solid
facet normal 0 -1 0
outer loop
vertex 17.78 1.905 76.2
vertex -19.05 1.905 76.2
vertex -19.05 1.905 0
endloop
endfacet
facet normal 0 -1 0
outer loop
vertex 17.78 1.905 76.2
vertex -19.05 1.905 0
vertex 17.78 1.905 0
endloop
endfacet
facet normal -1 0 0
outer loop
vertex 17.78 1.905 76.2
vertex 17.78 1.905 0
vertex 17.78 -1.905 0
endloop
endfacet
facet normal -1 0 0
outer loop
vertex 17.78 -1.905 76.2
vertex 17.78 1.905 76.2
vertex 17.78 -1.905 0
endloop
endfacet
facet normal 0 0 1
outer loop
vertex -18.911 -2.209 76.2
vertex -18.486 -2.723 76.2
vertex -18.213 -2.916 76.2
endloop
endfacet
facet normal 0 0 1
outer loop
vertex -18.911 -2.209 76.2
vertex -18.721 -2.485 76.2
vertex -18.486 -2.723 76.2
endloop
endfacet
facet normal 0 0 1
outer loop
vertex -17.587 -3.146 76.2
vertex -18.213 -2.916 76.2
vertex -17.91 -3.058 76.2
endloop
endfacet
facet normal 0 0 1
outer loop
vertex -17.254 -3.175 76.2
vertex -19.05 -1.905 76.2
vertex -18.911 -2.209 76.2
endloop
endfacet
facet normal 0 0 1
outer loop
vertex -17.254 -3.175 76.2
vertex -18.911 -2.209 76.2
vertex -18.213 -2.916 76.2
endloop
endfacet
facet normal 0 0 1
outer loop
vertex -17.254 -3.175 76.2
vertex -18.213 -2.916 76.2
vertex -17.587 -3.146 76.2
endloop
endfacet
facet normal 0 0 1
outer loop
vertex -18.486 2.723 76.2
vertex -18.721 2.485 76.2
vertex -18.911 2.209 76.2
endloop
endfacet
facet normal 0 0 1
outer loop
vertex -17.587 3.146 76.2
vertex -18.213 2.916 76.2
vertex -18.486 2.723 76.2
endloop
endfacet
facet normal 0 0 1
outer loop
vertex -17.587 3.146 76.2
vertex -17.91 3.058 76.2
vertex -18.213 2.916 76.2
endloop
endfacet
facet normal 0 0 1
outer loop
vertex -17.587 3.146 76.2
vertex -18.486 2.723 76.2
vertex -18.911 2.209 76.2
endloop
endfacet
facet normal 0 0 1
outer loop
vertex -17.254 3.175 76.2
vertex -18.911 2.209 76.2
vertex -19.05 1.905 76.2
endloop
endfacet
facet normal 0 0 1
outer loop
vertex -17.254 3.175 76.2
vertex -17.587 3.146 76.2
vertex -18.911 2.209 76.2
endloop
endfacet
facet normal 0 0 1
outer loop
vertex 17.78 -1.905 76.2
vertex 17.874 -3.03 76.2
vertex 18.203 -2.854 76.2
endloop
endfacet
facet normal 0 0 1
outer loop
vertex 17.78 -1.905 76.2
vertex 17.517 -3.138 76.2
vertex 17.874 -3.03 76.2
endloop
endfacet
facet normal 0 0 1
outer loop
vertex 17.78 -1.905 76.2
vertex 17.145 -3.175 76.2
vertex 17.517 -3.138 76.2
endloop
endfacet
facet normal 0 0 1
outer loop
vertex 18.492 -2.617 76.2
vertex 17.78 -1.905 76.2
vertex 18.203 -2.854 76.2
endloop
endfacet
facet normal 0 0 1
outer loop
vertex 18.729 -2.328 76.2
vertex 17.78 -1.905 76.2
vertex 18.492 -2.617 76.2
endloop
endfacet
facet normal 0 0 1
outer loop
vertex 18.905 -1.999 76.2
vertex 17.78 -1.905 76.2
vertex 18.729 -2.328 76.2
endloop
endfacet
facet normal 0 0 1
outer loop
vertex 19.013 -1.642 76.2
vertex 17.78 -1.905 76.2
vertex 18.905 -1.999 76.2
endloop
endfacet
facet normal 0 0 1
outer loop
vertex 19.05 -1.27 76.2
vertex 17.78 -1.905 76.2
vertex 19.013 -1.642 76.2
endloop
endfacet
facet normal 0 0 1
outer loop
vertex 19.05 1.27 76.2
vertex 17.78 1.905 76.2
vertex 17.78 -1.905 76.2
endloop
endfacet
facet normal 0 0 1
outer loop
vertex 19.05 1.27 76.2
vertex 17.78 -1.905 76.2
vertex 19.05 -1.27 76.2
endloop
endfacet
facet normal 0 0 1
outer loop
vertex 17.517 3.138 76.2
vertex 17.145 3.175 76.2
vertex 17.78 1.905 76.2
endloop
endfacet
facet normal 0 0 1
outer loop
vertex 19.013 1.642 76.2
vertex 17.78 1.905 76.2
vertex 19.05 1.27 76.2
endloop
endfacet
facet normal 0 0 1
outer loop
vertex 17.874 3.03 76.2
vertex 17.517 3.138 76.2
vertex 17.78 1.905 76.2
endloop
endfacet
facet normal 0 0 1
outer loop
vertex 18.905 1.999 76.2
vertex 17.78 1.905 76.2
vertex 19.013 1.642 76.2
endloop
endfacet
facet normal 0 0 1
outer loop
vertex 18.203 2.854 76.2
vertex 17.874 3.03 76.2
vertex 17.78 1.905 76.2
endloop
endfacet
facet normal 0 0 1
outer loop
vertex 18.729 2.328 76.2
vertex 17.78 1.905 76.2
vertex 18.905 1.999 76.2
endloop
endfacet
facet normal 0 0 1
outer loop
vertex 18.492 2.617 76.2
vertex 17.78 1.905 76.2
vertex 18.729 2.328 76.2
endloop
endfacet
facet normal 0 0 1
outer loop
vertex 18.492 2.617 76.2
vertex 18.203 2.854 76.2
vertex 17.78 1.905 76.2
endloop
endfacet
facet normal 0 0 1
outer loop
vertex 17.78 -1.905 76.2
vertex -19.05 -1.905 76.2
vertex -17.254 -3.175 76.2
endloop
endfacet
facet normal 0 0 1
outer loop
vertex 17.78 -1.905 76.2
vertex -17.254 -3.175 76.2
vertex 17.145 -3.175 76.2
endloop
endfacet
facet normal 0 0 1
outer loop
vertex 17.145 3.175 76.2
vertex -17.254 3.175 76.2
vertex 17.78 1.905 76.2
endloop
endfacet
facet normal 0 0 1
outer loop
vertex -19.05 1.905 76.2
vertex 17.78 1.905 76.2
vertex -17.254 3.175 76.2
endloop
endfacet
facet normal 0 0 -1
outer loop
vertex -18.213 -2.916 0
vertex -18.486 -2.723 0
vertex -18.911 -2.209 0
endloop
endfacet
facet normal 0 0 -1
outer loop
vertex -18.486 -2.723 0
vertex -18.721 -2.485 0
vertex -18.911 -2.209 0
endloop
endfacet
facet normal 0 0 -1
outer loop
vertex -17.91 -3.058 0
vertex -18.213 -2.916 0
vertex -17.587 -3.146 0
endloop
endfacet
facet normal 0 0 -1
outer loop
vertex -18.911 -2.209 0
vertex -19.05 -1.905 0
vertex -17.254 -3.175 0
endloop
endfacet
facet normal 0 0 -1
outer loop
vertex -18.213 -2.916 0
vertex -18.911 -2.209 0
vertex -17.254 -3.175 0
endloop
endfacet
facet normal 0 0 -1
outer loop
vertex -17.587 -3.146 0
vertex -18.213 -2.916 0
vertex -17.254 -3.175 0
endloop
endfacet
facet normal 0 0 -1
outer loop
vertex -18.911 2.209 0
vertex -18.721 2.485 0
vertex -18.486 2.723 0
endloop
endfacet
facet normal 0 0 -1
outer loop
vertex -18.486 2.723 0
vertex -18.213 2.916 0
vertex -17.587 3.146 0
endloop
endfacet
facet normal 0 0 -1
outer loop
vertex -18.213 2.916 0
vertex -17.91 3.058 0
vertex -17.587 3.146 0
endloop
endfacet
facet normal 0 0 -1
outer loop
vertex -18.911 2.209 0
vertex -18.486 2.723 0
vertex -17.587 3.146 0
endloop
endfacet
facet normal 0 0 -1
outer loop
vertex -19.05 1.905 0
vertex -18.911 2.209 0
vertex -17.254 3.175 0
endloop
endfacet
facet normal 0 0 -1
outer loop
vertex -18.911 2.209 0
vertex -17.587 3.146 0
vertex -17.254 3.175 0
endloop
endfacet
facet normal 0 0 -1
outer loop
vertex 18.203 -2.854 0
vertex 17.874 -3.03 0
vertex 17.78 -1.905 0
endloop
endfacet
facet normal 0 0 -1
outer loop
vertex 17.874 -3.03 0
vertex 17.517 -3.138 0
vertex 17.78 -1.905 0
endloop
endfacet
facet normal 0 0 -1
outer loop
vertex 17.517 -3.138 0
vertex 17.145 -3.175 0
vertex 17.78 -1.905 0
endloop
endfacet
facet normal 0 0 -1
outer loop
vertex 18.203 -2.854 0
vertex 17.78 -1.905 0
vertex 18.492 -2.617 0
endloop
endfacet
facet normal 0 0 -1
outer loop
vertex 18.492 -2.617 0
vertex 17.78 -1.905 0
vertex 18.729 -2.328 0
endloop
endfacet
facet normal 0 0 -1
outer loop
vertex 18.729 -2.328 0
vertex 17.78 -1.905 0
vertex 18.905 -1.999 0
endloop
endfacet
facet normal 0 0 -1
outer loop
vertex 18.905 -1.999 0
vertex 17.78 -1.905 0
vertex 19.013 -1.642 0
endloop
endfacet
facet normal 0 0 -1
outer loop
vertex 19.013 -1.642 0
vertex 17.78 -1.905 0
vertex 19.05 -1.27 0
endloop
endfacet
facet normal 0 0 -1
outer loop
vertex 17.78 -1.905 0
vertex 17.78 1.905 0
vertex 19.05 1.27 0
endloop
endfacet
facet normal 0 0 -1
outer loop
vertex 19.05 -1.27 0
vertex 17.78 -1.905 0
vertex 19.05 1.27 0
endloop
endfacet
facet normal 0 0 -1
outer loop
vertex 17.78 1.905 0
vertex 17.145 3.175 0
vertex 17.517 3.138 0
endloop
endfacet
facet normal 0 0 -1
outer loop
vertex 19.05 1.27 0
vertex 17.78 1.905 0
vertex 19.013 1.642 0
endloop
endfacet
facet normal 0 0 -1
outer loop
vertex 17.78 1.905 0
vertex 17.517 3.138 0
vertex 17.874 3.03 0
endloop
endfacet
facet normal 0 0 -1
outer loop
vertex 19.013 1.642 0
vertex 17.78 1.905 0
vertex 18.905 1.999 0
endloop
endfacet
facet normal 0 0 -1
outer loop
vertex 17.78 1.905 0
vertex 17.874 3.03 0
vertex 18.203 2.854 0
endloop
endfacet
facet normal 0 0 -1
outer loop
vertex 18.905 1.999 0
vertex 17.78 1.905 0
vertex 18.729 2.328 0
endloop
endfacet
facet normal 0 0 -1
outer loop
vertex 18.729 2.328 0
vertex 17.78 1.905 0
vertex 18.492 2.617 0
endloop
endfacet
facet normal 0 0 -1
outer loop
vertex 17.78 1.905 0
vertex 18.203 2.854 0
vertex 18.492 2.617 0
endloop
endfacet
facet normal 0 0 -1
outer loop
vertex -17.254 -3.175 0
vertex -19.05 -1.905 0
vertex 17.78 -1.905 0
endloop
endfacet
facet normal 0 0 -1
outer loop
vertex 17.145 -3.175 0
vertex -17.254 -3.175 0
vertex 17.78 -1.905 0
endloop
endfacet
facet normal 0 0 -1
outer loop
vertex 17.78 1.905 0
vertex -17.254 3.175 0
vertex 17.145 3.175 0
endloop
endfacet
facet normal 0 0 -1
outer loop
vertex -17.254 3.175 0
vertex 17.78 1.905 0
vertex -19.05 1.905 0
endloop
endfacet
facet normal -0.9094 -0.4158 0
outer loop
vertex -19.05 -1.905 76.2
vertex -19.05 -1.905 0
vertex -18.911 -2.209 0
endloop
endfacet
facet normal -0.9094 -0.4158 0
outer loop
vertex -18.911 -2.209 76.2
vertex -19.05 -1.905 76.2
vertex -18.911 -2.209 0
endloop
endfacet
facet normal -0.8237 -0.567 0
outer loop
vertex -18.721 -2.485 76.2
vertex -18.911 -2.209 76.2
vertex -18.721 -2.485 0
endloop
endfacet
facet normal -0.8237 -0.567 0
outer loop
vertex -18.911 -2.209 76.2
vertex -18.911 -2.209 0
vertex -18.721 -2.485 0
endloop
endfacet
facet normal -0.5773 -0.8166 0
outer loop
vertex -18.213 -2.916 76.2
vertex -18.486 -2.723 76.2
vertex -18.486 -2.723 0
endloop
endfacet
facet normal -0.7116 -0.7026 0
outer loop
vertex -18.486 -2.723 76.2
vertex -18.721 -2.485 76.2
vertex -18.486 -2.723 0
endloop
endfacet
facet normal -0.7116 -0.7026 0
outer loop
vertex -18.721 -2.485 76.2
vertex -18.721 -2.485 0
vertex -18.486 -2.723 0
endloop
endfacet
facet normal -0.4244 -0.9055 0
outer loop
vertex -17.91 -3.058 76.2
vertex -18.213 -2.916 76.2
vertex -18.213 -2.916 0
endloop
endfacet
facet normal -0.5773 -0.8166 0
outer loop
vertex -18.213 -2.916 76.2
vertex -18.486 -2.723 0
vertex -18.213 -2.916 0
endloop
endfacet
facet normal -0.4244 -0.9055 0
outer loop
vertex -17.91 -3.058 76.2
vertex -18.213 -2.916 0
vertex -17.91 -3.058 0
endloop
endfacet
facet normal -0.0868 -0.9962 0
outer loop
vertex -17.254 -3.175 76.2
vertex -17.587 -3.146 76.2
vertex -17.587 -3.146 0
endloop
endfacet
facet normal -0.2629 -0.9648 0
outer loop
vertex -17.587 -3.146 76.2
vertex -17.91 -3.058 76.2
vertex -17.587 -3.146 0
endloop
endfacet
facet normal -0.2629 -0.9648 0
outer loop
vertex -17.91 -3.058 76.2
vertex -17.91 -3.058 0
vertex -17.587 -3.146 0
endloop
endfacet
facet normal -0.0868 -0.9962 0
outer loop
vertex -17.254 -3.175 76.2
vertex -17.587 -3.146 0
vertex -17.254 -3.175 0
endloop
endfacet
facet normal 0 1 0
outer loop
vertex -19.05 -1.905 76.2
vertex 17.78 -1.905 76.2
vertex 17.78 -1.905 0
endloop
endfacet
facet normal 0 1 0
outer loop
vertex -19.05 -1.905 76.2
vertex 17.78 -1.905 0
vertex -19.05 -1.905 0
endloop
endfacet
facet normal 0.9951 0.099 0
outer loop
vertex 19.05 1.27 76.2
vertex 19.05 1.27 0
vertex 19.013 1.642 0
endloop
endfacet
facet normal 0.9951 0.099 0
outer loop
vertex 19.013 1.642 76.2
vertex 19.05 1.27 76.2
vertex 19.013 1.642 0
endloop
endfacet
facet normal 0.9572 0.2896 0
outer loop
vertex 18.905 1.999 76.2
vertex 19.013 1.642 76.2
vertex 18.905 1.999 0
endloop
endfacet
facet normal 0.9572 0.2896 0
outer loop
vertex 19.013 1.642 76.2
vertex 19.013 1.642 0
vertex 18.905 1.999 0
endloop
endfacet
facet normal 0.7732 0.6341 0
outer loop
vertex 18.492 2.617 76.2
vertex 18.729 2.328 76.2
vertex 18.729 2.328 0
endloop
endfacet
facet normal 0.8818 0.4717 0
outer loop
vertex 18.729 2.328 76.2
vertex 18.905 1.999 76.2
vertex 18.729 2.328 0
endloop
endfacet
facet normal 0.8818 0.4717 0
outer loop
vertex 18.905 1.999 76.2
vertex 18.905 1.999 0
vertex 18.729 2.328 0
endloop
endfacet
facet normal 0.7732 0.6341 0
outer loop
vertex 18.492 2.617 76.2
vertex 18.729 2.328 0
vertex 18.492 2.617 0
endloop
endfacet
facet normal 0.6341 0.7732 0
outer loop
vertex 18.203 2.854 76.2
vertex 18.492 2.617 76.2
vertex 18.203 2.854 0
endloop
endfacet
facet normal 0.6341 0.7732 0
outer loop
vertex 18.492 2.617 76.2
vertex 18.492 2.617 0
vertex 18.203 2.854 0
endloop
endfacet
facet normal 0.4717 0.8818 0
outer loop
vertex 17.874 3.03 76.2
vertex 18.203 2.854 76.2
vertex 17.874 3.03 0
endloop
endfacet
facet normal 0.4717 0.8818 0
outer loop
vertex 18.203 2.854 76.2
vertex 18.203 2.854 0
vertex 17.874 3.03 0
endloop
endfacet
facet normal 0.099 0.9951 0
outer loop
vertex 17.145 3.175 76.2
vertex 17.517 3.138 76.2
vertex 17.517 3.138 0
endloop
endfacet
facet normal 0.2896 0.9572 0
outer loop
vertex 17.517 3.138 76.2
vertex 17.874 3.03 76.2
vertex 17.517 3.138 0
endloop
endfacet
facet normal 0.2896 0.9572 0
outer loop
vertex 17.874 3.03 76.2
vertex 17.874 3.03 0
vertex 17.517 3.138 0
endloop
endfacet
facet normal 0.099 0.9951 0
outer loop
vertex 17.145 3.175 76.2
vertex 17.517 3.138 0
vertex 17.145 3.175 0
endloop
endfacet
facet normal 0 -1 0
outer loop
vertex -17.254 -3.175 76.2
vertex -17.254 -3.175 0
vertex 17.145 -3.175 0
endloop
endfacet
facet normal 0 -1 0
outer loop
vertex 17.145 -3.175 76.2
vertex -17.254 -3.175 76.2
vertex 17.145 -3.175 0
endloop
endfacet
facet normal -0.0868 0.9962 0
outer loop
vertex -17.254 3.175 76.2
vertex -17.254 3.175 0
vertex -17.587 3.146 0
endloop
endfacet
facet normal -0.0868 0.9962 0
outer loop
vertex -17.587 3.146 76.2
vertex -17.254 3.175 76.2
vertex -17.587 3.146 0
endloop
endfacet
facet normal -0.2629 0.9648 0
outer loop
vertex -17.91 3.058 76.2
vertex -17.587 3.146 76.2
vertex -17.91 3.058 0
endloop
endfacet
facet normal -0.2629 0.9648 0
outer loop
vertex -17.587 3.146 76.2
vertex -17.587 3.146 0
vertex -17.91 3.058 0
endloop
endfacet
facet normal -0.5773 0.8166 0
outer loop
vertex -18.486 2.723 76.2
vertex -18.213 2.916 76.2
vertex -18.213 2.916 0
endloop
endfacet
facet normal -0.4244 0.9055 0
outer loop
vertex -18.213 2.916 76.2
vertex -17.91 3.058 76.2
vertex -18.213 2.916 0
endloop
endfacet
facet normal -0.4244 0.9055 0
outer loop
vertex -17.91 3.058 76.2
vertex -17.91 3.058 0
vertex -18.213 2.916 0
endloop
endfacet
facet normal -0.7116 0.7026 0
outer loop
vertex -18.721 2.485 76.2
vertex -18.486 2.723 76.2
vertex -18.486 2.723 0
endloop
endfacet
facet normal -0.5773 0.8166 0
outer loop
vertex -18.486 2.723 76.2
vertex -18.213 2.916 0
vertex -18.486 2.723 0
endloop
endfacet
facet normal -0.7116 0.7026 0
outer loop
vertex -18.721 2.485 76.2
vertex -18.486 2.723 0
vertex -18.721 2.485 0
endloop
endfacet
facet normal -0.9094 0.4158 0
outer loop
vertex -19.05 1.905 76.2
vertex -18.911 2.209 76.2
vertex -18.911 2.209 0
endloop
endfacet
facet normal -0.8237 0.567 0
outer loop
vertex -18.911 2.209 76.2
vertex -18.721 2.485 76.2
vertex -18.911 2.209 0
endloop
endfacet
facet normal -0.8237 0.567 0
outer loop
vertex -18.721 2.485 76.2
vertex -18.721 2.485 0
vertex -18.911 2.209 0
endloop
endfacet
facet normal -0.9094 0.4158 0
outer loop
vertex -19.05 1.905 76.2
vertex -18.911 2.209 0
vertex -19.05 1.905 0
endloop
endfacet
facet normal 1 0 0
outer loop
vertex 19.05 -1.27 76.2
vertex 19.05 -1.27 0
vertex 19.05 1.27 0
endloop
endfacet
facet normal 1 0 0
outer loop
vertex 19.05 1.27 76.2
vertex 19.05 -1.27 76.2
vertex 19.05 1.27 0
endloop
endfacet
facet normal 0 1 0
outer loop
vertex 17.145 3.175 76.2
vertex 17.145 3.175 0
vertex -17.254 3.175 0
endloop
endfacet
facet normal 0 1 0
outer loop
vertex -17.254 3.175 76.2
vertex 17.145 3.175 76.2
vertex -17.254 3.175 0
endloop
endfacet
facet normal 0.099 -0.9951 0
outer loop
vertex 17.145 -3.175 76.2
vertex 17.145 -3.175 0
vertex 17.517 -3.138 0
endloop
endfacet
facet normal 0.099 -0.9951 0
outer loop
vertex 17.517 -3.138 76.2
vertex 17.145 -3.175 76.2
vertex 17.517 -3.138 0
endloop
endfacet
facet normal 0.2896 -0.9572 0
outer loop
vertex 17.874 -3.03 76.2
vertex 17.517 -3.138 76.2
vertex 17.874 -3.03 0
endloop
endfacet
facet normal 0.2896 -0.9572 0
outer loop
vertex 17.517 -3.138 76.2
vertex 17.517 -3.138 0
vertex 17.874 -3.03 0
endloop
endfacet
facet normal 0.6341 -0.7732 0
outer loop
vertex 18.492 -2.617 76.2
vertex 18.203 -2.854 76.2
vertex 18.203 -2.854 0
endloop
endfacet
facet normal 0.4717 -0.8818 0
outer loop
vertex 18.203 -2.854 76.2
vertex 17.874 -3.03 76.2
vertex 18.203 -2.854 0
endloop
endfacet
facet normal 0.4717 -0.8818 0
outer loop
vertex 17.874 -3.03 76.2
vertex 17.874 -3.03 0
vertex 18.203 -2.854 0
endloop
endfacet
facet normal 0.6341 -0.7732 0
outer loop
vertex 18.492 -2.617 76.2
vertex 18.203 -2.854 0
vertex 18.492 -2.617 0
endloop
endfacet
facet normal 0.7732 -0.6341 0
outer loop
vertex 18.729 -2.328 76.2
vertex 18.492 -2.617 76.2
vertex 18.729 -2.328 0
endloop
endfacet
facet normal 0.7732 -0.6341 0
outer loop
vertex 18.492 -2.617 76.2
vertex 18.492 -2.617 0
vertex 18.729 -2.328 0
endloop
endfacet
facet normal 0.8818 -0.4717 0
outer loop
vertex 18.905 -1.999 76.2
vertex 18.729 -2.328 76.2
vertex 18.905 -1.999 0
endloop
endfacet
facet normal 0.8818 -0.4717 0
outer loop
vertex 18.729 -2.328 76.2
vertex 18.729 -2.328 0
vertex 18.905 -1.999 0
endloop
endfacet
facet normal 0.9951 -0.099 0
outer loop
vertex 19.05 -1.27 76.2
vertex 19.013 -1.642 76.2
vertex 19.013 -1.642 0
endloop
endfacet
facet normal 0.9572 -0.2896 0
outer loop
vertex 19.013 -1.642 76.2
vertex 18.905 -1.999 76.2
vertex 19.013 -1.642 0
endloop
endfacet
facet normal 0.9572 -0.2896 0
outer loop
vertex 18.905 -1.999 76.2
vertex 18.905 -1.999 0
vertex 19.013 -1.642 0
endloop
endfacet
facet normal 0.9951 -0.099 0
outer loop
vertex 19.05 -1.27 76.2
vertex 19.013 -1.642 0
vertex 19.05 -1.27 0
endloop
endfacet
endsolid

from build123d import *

# Parameters (mm, degrees)
F1_DEPTH    = 76.2
F2_T1_DEPTH = 85.725
F2_T3_DEPTH = 85.1802561211


# Not quite as in the source:
# - a fillet or chamfer that OpenCascade refuses, or shapes differently, is made with other operations: its cross-section is extruded or revolved along the edge and cut away or added


with BuildPart() as f1:
    # F0 (on Top) → F1 (new body)
    with BuildSketch(Plane.XY):
        Polygon((-19.05, -3.175), (19.05, -3.175), (19.05, 3.175), (-19.05, 3.175), (-19.05, 1.905), (17.78, 1.905), (17.78, -1.905), (-19.05, -1.905), align=None)
    extrude(amount=F1_DEPTH)

    # F2: fillet of radius 1.905 on 4 edges, made by hand

    # F2_s2 → F2_t1 (cut)
    with BuildSketch(Plane.XY.offset(-4.7625)):
        with BuildLine():
            ThreePointArc((19.05, 1.27), (18.4920384182, 2.6170384182), (17.145, 3.175))
            Line((17.145, 3.175), (19.05, 3.175))
            Line((19.05, 3.175), (19.05, 1.27))
        make_face()
        with BuildLine():
            ThreePointArc((17.145, -3.175), (18.4920384182, -2.6170384182), (19.05, -1.27))
            Line((19.05, -1.27), (19.05, -3.175))
            Line((19.05, -3.175), (17.145, -3.175))
        make_face()
    extrude(amount=F2_T1_DEPTH, mode=Mode.SUBTRACT)

    # F2_s4 → F2_t3 (cut)
    with BuildSketch(Plane.XY.offset(-4.4901280605)):
        with BuildLine():
            ThreePointArc((-19.05, -1.905), (-18.3538010386, -2.8254259867), (-17.2539487758, -3.175))
            Line((-17.2539487758, -3.175), (-19.05, -3.175))
            Line((-19.05, -3.175), (-19.05, -1.905))
        make_face()
        with BuildLine():
            ThreePointArc((-17.2539487758, 3.175), (-18.3538010386, 2.8254259867), (-19.05, 1.905))
            Line((-19.05, 1.905), (-19.05, 3.175))
            Line((-19.05, 3.175), (-17.2539487758, 3.175))
        make_face()
    extrude(amount=F2_T3_DEPTH, mode=Mode.SUBTRACT)


solid = f1.part
